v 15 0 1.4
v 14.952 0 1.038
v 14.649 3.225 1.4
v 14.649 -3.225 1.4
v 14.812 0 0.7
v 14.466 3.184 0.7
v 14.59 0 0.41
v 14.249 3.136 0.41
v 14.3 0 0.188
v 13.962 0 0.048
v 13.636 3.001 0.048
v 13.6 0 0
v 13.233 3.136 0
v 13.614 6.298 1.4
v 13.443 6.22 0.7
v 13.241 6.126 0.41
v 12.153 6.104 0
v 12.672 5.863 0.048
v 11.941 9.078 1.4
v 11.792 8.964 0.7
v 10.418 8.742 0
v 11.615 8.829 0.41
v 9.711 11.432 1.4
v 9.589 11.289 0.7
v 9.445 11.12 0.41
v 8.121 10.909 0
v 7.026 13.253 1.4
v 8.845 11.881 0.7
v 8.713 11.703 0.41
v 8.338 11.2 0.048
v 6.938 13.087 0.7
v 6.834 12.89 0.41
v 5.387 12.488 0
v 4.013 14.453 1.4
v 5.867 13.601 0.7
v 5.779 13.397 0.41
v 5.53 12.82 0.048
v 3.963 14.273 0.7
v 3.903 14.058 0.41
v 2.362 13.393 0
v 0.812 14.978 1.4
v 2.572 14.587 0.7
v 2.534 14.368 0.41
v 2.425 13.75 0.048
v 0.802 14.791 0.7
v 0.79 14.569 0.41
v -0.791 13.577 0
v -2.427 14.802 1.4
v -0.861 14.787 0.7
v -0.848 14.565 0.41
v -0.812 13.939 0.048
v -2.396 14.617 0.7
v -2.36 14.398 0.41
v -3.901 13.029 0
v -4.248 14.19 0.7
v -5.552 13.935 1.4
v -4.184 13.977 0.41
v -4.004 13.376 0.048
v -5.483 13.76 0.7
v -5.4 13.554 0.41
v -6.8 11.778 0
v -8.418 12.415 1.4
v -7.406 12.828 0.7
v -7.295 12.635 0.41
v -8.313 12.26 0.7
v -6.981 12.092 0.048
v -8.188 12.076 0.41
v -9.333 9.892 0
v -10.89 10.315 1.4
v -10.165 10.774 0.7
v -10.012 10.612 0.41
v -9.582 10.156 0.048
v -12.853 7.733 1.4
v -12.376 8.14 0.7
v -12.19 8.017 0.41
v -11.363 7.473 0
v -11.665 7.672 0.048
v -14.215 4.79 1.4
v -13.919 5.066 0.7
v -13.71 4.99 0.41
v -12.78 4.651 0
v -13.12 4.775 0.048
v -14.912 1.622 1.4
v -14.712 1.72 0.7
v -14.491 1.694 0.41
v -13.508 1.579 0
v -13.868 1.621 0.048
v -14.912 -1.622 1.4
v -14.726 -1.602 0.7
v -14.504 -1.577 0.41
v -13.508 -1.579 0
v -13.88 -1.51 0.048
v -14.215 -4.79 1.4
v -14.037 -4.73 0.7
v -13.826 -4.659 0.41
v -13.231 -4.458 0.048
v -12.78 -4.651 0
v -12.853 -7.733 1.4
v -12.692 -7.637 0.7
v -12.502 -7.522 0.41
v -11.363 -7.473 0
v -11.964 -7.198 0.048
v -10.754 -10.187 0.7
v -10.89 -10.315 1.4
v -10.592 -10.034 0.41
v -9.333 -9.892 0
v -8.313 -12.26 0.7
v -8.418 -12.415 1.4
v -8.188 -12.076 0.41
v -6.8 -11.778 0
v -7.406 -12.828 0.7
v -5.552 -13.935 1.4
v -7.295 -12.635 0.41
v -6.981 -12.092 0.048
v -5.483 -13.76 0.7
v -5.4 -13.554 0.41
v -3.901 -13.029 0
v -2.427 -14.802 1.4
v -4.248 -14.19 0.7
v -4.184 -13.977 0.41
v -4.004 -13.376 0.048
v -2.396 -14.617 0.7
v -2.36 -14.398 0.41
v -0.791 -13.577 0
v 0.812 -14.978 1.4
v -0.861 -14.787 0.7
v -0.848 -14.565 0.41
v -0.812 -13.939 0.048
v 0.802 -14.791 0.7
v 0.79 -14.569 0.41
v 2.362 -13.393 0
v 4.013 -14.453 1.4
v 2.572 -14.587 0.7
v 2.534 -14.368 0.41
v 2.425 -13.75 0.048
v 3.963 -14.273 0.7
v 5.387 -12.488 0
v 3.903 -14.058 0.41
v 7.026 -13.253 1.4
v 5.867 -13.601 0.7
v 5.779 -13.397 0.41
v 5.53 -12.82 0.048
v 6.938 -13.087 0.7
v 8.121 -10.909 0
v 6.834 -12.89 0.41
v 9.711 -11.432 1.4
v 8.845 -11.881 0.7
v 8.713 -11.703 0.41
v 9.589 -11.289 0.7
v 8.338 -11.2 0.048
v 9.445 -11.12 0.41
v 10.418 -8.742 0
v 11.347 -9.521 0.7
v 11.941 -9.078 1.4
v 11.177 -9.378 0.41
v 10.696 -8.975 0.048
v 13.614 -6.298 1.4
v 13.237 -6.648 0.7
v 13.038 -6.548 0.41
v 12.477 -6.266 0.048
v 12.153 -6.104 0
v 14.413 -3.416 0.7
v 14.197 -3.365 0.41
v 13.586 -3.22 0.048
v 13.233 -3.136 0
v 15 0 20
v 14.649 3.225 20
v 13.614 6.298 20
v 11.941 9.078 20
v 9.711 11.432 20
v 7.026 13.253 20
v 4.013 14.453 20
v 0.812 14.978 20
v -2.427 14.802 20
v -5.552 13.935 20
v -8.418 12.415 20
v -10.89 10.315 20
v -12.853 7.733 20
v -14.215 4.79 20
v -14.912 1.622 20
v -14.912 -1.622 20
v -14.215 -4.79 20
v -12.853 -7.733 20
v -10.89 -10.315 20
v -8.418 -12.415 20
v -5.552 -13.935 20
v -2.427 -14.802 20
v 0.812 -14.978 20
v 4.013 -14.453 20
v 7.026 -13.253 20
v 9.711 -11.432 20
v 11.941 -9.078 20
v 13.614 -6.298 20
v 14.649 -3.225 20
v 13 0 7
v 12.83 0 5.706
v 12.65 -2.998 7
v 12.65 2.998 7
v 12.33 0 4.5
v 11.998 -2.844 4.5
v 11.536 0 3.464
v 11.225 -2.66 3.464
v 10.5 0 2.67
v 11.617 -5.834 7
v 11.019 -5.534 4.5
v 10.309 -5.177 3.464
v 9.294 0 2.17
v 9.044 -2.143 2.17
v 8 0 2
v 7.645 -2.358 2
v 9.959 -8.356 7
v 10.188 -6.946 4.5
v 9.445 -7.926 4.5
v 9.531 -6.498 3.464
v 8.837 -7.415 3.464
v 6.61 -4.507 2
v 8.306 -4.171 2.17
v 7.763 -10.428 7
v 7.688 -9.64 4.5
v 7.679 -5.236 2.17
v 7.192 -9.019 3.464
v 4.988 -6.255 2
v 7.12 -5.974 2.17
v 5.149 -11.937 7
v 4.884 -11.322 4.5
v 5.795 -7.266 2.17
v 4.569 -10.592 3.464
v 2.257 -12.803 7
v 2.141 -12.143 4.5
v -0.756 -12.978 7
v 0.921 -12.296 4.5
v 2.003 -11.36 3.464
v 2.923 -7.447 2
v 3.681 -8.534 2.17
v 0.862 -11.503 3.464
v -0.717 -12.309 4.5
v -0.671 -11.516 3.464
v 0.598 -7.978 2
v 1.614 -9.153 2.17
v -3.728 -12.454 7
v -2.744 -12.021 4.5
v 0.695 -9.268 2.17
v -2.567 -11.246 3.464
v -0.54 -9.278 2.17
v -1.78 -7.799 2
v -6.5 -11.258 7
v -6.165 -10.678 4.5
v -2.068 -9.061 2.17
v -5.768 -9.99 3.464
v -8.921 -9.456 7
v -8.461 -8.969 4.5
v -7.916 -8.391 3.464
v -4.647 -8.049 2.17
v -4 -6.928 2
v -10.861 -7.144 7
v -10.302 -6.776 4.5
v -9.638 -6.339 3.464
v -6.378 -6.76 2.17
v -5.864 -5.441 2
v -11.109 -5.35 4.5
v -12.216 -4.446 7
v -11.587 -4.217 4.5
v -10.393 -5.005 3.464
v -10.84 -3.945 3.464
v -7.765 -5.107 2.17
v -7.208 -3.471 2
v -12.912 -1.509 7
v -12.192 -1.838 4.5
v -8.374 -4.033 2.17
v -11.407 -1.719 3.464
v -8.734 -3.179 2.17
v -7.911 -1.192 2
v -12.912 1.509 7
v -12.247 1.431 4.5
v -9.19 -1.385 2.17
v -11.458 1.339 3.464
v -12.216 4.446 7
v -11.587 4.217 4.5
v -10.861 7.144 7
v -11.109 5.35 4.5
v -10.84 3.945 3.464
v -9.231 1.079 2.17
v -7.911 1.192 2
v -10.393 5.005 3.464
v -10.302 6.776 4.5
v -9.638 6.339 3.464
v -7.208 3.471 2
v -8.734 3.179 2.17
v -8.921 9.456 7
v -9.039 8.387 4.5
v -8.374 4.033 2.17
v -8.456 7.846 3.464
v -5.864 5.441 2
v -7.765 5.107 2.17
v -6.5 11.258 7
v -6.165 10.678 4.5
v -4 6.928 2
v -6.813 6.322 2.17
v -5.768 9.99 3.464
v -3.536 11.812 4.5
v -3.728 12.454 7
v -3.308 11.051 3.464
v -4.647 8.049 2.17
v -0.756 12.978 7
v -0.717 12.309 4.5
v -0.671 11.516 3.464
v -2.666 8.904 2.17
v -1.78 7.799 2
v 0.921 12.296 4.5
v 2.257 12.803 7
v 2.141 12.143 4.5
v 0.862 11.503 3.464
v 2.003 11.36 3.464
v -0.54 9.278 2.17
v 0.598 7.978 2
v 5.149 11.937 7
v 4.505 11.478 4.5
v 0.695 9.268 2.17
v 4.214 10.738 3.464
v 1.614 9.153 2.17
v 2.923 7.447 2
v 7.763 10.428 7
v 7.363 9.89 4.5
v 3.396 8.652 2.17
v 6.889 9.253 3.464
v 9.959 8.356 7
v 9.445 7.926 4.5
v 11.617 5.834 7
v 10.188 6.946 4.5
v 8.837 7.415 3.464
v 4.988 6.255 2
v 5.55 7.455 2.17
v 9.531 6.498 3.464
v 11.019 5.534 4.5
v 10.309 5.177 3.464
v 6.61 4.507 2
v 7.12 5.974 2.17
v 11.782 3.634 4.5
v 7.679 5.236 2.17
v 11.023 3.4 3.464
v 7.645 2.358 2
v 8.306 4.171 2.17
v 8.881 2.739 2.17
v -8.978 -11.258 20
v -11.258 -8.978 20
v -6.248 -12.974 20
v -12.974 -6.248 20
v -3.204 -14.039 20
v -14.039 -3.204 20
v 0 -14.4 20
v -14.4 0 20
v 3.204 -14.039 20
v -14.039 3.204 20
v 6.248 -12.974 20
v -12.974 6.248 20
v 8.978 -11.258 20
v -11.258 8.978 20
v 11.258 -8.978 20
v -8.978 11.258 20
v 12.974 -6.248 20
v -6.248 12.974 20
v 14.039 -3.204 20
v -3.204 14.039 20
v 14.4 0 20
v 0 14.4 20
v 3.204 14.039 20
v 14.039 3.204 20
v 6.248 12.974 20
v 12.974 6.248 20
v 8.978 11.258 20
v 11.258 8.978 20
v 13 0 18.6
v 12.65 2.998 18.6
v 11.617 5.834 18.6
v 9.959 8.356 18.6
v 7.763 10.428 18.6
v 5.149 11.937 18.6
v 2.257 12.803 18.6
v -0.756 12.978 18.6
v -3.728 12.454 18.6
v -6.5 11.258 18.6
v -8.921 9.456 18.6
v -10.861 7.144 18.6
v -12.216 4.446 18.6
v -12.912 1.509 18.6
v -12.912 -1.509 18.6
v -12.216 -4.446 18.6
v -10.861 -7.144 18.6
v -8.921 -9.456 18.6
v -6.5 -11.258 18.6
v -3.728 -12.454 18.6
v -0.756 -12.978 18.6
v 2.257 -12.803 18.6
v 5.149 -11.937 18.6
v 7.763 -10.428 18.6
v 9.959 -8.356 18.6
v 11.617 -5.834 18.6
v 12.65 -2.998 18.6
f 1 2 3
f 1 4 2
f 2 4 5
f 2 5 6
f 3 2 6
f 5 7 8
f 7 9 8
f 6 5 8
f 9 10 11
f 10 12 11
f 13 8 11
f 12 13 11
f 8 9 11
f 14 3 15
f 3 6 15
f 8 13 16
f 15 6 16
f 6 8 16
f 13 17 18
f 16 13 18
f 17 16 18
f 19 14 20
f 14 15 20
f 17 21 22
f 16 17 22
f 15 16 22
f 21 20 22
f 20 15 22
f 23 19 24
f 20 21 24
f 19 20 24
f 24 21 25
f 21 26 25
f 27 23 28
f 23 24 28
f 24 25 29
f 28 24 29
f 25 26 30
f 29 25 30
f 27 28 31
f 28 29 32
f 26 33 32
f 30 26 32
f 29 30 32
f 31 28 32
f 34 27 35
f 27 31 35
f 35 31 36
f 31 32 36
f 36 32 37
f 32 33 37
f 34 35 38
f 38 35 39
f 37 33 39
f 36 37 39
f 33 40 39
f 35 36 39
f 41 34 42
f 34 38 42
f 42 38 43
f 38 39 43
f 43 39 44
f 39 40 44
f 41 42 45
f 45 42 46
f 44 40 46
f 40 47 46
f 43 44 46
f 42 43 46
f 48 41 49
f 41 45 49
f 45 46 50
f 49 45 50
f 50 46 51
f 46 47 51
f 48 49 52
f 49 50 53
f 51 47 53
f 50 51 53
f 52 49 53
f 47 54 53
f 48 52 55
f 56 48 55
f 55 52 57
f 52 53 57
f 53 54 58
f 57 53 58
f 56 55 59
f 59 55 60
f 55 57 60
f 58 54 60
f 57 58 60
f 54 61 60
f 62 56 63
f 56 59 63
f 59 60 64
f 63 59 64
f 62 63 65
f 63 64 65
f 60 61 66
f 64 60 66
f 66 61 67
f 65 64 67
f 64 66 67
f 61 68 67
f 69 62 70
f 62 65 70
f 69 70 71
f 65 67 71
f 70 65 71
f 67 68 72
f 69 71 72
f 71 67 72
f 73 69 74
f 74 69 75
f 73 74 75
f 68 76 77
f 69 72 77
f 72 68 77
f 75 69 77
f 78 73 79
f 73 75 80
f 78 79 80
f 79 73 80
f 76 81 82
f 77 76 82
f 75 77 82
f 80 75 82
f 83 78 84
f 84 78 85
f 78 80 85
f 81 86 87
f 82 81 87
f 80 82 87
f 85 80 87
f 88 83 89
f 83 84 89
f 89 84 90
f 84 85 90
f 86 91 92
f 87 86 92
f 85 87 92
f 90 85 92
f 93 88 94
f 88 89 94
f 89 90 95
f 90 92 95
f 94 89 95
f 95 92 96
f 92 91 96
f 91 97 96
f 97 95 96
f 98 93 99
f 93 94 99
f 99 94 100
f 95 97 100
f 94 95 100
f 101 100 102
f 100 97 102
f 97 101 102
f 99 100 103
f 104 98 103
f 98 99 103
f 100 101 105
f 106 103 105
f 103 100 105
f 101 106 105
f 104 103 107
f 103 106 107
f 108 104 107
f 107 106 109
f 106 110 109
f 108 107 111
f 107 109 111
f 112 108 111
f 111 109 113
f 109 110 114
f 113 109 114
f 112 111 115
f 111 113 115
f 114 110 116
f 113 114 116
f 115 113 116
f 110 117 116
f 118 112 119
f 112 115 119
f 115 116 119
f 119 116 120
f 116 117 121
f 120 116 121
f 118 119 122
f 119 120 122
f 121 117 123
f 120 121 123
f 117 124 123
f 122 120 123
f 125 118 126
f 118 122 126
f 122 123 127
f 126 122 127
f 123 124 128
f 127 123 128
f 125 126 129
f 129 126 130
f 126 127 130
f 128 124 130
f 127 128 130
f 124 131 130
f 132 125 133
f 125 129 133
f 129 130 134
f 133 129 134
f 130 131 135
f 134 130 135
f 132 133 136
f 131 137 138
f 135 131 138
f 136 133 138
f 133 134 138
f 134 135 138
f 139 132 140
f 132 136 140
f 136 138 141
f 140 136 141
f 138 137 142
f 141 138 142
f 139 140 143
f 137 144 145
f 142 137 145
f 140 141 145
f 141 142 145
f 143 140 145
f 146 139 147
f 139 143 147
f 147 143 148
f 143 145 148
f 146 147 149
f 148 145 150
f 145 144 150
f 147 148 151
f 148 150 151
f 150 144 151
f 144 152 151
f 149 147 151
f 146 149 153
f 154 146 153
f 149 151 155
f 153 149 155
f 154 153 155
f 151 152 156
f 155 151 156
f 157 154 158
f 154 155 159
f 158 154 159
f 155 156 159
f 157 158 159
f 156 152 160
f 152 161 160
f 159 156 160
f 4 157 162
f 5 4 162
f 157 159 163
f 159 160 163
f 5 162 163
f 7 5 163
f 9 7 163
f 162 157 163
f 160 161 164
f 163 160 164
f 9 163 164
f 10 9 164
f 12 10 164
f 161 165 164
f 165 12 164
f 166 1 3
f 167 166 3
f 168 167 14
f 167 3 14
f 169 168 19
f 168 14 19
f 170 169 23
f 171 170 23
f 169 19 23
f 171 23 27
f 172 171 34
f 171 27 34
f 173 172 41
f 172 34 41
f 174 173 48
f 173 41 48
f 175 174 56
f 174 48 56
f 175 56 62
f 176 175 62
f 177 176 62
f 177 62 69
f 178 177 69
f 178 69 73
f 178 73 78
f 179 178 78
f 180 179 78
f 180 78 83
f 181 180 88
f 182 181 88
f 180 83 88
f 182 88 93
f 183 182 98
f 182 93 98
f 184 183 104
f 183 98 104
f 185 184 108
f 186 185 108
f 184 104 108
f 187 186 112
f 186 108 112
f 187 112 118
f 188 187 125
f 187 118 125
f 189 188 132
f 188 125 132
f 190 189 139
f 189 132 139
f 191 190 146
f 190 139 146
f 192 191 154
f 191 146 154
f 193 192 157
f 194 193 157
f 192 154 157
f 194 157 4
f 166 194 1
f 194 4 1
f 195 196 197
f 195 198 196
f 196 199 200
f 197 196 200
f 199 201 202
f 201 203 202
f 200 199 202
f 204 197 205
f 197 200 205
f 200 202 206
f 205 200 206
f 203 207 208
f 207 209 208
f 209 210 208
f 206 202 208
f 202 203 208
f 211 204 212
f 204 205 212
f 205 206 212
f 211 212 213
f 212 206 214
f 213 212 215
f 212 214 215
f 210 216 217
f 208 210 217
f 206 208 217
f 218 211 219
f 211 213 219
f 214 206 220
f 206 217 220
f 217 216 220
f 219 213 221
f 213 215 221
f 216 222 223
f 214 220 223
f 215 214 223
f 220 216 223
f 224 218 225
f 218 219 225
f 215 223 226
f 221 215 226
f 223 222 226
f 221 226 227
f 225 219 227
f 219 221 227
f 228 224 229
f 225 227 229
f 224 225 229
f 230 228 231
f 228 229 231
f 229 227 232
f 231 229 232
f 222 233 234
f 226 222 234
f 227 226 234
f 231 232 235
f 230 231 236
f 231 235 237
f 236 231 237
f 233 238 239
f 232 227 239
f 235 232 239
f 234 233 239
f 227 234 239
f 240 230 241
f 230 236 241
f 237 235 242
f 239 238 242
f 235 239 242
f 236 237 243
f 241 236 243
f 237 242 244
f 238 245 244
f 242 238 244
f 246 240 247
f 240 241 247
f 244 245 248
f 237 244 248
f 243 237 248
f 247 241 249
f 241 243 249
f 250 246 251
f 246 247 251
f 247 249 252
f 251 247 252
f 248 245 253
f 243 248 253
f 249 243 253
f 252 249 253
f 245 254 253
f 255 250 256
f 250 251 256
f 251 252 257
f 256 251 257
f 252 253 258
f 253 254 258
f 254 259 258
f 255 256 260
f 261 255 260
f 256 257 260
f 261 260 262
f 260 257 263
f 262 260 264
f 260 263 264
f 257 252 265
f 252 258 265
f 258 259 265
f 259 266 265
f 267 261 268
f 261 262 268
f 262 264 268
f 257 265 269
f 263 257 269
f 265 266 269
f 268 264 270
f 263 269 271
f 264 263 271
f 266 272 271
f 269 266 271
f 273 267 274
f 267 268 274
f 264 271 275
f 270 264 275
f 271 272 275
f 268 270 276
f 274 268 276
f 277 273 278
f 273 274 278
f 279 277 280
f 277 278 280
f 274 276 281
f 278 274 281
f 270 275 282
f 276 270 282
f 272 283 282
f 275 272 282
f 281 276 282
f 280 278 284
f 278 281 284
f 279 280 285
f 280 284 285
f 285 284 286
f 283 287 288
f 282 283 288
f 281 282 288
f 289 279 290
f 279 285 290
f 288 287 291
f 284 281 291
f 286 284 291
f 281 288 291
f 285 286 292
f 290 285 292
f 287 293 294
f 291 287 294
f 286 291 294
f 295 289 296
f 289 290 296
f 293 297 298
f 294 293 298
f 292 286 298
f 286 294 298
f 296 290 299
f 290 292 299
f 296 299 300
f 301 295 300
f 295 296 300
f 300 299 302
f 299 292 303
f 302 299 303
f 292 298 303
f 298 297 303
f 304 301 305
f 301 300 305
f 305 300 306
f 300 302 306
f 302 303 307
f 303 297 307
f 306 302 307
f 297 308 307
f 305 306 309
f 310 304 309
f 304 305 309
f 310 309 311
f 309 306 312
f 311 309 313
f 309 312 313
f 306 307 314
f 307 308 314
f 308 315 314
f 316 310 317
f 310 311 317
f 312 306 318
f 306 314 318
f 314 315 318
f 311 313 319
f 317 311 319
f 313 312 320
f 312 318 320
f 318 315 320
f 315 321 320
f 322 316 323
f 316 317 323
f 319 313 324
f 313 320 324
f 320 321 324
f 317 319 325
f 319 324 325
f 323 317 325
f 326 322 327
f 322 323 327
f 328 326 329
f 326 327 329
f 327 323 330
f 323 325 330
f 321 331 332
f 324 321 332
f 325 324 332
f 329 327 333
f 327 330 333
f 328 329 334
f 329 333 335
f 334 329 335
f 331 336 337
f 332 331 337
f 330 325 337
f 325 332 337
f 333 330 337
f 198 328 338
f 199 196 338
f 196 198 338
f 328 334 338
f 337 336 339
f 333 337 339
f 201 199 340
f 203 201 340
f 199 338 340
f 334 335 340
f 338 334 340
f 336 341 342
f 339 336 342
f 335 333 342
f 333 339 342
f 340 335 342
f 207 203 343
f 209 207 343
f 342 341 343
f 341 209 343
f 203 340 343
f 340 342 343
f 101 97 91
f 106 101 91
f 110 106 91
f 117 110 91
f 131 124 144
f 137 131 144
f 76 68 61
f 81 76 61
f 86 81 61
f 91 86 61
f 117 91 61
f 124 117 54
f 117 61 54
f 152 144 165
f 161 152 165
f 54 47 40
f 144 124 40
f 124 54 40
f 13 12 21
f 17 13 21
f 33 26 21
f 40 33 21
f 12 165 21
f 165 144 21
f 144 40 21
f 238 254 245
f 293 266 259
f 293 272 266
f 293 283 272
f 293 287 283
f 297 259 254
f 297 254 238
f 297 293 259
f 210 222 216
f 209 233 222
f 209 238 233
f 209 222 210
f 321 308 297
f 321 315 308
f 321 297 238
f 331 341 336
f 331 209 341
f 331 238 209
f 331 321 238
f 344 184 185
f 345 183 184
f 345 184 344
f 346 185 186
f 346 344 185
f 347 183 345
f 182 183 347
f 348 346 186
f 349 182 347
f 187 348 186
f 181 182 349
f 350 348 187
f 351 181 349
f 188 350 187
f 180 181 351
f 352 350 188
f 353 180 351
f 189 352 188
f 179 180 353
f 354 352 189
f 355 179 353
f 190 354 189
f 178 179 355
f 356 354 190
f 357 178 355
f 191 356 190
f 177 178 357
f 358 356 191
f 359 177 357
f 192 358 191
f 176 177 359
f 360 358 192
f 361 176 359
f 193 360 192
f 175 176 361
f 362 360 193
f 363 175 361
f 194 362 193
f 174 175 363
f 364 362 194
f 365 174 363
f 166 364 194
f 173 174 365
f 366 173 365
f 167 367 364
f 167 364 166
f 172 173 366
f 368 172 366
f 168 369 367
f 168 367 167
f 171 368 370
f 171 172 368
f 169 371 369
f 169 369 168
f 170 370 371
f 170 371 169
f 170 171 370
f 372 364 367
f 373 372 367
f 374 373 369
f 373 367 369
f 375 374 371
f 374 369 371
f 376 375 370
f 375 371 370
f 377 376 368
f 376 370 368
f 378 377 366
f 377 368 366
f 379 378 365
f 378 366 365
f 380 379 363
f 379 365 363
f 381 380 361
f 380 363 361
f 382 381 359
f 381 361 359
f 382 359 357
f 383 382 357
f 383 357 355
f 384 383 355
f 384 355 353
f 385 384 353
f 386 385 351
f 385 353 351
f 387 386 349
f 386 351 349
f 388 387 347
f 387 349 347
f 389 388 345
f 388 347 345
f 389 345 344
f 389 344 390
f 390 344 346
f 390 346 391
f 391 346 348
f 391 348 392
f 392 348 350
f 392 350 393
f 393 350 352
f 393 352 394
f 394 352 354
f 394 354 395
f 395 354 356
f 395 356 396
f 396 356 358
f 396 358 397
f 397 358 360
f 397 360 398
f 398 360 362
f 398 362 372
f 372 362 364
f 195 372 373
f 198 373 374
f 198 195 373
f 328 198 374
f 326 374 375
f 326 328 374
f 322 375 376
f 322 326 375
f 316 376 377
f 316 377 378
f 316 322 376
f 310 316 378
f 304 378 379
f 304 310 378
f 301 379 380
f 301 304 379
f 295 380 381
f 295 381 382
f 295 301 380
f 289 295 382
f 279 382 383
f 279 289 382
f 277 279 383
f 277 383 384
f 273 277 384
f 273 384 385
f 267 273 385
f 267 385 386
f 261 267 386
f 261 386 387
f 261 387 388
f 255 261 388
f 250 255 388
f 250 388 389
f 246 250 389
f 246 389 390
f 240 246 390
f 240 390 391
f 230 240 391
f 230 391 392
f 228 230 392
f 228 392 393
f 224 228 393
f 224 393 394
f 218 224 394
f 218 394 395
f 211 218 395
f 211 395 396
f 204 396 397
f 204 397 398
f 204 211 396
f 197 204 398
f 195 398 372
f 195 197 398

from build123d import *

# Parameters (mm, degrees)
F0_R     = 15
F0_R_2   = 13
F1_DEPTH = 2
F2_DEPTH = 20
F3_R     = 5
F4_SIZE  = 1.4
F5_R     = 1.4


with BuildPart() as f1:
    # F0 (on Top) → F1 (new body)
    with BuildSketch(Plane.XY):
        Circle(F0_R)
        Circle(F0_R_2, mode=Mode.SUBTRACT)
        Circle(F0_R_2)
    extrude(amount=F1_DEPTH)

    # F0 (on Top) → F2 (join)
    with BuildSketch(Plane.XY):
        Circle(F0_R)
        Circle(F0_R_2, mode=Mode.SUBTRACT)
    extrude(amount=F2_DEPTH)

    # F3
    f3_edges = [f1.edges().sort_by_distance(p)[0] for p in [
        (-13, 0, 2),
    ]]
    fillet(f3_edges, radius=F3_R)

    # F4
    f4_edges = [f1.edges().sort_by_distance(p)[0] for p in [
        (-13, 0, 20),
    ]]
    chamfer(f4_edges, length=F4_SIZE)

    # F5
    f5_edges = [f1.edges().sort_by_distance(p)[0] for p in [
        (-15, 0, 0),
    ]]
    fillet(f5_edges, radius=F5_R)


solid = f1.part
